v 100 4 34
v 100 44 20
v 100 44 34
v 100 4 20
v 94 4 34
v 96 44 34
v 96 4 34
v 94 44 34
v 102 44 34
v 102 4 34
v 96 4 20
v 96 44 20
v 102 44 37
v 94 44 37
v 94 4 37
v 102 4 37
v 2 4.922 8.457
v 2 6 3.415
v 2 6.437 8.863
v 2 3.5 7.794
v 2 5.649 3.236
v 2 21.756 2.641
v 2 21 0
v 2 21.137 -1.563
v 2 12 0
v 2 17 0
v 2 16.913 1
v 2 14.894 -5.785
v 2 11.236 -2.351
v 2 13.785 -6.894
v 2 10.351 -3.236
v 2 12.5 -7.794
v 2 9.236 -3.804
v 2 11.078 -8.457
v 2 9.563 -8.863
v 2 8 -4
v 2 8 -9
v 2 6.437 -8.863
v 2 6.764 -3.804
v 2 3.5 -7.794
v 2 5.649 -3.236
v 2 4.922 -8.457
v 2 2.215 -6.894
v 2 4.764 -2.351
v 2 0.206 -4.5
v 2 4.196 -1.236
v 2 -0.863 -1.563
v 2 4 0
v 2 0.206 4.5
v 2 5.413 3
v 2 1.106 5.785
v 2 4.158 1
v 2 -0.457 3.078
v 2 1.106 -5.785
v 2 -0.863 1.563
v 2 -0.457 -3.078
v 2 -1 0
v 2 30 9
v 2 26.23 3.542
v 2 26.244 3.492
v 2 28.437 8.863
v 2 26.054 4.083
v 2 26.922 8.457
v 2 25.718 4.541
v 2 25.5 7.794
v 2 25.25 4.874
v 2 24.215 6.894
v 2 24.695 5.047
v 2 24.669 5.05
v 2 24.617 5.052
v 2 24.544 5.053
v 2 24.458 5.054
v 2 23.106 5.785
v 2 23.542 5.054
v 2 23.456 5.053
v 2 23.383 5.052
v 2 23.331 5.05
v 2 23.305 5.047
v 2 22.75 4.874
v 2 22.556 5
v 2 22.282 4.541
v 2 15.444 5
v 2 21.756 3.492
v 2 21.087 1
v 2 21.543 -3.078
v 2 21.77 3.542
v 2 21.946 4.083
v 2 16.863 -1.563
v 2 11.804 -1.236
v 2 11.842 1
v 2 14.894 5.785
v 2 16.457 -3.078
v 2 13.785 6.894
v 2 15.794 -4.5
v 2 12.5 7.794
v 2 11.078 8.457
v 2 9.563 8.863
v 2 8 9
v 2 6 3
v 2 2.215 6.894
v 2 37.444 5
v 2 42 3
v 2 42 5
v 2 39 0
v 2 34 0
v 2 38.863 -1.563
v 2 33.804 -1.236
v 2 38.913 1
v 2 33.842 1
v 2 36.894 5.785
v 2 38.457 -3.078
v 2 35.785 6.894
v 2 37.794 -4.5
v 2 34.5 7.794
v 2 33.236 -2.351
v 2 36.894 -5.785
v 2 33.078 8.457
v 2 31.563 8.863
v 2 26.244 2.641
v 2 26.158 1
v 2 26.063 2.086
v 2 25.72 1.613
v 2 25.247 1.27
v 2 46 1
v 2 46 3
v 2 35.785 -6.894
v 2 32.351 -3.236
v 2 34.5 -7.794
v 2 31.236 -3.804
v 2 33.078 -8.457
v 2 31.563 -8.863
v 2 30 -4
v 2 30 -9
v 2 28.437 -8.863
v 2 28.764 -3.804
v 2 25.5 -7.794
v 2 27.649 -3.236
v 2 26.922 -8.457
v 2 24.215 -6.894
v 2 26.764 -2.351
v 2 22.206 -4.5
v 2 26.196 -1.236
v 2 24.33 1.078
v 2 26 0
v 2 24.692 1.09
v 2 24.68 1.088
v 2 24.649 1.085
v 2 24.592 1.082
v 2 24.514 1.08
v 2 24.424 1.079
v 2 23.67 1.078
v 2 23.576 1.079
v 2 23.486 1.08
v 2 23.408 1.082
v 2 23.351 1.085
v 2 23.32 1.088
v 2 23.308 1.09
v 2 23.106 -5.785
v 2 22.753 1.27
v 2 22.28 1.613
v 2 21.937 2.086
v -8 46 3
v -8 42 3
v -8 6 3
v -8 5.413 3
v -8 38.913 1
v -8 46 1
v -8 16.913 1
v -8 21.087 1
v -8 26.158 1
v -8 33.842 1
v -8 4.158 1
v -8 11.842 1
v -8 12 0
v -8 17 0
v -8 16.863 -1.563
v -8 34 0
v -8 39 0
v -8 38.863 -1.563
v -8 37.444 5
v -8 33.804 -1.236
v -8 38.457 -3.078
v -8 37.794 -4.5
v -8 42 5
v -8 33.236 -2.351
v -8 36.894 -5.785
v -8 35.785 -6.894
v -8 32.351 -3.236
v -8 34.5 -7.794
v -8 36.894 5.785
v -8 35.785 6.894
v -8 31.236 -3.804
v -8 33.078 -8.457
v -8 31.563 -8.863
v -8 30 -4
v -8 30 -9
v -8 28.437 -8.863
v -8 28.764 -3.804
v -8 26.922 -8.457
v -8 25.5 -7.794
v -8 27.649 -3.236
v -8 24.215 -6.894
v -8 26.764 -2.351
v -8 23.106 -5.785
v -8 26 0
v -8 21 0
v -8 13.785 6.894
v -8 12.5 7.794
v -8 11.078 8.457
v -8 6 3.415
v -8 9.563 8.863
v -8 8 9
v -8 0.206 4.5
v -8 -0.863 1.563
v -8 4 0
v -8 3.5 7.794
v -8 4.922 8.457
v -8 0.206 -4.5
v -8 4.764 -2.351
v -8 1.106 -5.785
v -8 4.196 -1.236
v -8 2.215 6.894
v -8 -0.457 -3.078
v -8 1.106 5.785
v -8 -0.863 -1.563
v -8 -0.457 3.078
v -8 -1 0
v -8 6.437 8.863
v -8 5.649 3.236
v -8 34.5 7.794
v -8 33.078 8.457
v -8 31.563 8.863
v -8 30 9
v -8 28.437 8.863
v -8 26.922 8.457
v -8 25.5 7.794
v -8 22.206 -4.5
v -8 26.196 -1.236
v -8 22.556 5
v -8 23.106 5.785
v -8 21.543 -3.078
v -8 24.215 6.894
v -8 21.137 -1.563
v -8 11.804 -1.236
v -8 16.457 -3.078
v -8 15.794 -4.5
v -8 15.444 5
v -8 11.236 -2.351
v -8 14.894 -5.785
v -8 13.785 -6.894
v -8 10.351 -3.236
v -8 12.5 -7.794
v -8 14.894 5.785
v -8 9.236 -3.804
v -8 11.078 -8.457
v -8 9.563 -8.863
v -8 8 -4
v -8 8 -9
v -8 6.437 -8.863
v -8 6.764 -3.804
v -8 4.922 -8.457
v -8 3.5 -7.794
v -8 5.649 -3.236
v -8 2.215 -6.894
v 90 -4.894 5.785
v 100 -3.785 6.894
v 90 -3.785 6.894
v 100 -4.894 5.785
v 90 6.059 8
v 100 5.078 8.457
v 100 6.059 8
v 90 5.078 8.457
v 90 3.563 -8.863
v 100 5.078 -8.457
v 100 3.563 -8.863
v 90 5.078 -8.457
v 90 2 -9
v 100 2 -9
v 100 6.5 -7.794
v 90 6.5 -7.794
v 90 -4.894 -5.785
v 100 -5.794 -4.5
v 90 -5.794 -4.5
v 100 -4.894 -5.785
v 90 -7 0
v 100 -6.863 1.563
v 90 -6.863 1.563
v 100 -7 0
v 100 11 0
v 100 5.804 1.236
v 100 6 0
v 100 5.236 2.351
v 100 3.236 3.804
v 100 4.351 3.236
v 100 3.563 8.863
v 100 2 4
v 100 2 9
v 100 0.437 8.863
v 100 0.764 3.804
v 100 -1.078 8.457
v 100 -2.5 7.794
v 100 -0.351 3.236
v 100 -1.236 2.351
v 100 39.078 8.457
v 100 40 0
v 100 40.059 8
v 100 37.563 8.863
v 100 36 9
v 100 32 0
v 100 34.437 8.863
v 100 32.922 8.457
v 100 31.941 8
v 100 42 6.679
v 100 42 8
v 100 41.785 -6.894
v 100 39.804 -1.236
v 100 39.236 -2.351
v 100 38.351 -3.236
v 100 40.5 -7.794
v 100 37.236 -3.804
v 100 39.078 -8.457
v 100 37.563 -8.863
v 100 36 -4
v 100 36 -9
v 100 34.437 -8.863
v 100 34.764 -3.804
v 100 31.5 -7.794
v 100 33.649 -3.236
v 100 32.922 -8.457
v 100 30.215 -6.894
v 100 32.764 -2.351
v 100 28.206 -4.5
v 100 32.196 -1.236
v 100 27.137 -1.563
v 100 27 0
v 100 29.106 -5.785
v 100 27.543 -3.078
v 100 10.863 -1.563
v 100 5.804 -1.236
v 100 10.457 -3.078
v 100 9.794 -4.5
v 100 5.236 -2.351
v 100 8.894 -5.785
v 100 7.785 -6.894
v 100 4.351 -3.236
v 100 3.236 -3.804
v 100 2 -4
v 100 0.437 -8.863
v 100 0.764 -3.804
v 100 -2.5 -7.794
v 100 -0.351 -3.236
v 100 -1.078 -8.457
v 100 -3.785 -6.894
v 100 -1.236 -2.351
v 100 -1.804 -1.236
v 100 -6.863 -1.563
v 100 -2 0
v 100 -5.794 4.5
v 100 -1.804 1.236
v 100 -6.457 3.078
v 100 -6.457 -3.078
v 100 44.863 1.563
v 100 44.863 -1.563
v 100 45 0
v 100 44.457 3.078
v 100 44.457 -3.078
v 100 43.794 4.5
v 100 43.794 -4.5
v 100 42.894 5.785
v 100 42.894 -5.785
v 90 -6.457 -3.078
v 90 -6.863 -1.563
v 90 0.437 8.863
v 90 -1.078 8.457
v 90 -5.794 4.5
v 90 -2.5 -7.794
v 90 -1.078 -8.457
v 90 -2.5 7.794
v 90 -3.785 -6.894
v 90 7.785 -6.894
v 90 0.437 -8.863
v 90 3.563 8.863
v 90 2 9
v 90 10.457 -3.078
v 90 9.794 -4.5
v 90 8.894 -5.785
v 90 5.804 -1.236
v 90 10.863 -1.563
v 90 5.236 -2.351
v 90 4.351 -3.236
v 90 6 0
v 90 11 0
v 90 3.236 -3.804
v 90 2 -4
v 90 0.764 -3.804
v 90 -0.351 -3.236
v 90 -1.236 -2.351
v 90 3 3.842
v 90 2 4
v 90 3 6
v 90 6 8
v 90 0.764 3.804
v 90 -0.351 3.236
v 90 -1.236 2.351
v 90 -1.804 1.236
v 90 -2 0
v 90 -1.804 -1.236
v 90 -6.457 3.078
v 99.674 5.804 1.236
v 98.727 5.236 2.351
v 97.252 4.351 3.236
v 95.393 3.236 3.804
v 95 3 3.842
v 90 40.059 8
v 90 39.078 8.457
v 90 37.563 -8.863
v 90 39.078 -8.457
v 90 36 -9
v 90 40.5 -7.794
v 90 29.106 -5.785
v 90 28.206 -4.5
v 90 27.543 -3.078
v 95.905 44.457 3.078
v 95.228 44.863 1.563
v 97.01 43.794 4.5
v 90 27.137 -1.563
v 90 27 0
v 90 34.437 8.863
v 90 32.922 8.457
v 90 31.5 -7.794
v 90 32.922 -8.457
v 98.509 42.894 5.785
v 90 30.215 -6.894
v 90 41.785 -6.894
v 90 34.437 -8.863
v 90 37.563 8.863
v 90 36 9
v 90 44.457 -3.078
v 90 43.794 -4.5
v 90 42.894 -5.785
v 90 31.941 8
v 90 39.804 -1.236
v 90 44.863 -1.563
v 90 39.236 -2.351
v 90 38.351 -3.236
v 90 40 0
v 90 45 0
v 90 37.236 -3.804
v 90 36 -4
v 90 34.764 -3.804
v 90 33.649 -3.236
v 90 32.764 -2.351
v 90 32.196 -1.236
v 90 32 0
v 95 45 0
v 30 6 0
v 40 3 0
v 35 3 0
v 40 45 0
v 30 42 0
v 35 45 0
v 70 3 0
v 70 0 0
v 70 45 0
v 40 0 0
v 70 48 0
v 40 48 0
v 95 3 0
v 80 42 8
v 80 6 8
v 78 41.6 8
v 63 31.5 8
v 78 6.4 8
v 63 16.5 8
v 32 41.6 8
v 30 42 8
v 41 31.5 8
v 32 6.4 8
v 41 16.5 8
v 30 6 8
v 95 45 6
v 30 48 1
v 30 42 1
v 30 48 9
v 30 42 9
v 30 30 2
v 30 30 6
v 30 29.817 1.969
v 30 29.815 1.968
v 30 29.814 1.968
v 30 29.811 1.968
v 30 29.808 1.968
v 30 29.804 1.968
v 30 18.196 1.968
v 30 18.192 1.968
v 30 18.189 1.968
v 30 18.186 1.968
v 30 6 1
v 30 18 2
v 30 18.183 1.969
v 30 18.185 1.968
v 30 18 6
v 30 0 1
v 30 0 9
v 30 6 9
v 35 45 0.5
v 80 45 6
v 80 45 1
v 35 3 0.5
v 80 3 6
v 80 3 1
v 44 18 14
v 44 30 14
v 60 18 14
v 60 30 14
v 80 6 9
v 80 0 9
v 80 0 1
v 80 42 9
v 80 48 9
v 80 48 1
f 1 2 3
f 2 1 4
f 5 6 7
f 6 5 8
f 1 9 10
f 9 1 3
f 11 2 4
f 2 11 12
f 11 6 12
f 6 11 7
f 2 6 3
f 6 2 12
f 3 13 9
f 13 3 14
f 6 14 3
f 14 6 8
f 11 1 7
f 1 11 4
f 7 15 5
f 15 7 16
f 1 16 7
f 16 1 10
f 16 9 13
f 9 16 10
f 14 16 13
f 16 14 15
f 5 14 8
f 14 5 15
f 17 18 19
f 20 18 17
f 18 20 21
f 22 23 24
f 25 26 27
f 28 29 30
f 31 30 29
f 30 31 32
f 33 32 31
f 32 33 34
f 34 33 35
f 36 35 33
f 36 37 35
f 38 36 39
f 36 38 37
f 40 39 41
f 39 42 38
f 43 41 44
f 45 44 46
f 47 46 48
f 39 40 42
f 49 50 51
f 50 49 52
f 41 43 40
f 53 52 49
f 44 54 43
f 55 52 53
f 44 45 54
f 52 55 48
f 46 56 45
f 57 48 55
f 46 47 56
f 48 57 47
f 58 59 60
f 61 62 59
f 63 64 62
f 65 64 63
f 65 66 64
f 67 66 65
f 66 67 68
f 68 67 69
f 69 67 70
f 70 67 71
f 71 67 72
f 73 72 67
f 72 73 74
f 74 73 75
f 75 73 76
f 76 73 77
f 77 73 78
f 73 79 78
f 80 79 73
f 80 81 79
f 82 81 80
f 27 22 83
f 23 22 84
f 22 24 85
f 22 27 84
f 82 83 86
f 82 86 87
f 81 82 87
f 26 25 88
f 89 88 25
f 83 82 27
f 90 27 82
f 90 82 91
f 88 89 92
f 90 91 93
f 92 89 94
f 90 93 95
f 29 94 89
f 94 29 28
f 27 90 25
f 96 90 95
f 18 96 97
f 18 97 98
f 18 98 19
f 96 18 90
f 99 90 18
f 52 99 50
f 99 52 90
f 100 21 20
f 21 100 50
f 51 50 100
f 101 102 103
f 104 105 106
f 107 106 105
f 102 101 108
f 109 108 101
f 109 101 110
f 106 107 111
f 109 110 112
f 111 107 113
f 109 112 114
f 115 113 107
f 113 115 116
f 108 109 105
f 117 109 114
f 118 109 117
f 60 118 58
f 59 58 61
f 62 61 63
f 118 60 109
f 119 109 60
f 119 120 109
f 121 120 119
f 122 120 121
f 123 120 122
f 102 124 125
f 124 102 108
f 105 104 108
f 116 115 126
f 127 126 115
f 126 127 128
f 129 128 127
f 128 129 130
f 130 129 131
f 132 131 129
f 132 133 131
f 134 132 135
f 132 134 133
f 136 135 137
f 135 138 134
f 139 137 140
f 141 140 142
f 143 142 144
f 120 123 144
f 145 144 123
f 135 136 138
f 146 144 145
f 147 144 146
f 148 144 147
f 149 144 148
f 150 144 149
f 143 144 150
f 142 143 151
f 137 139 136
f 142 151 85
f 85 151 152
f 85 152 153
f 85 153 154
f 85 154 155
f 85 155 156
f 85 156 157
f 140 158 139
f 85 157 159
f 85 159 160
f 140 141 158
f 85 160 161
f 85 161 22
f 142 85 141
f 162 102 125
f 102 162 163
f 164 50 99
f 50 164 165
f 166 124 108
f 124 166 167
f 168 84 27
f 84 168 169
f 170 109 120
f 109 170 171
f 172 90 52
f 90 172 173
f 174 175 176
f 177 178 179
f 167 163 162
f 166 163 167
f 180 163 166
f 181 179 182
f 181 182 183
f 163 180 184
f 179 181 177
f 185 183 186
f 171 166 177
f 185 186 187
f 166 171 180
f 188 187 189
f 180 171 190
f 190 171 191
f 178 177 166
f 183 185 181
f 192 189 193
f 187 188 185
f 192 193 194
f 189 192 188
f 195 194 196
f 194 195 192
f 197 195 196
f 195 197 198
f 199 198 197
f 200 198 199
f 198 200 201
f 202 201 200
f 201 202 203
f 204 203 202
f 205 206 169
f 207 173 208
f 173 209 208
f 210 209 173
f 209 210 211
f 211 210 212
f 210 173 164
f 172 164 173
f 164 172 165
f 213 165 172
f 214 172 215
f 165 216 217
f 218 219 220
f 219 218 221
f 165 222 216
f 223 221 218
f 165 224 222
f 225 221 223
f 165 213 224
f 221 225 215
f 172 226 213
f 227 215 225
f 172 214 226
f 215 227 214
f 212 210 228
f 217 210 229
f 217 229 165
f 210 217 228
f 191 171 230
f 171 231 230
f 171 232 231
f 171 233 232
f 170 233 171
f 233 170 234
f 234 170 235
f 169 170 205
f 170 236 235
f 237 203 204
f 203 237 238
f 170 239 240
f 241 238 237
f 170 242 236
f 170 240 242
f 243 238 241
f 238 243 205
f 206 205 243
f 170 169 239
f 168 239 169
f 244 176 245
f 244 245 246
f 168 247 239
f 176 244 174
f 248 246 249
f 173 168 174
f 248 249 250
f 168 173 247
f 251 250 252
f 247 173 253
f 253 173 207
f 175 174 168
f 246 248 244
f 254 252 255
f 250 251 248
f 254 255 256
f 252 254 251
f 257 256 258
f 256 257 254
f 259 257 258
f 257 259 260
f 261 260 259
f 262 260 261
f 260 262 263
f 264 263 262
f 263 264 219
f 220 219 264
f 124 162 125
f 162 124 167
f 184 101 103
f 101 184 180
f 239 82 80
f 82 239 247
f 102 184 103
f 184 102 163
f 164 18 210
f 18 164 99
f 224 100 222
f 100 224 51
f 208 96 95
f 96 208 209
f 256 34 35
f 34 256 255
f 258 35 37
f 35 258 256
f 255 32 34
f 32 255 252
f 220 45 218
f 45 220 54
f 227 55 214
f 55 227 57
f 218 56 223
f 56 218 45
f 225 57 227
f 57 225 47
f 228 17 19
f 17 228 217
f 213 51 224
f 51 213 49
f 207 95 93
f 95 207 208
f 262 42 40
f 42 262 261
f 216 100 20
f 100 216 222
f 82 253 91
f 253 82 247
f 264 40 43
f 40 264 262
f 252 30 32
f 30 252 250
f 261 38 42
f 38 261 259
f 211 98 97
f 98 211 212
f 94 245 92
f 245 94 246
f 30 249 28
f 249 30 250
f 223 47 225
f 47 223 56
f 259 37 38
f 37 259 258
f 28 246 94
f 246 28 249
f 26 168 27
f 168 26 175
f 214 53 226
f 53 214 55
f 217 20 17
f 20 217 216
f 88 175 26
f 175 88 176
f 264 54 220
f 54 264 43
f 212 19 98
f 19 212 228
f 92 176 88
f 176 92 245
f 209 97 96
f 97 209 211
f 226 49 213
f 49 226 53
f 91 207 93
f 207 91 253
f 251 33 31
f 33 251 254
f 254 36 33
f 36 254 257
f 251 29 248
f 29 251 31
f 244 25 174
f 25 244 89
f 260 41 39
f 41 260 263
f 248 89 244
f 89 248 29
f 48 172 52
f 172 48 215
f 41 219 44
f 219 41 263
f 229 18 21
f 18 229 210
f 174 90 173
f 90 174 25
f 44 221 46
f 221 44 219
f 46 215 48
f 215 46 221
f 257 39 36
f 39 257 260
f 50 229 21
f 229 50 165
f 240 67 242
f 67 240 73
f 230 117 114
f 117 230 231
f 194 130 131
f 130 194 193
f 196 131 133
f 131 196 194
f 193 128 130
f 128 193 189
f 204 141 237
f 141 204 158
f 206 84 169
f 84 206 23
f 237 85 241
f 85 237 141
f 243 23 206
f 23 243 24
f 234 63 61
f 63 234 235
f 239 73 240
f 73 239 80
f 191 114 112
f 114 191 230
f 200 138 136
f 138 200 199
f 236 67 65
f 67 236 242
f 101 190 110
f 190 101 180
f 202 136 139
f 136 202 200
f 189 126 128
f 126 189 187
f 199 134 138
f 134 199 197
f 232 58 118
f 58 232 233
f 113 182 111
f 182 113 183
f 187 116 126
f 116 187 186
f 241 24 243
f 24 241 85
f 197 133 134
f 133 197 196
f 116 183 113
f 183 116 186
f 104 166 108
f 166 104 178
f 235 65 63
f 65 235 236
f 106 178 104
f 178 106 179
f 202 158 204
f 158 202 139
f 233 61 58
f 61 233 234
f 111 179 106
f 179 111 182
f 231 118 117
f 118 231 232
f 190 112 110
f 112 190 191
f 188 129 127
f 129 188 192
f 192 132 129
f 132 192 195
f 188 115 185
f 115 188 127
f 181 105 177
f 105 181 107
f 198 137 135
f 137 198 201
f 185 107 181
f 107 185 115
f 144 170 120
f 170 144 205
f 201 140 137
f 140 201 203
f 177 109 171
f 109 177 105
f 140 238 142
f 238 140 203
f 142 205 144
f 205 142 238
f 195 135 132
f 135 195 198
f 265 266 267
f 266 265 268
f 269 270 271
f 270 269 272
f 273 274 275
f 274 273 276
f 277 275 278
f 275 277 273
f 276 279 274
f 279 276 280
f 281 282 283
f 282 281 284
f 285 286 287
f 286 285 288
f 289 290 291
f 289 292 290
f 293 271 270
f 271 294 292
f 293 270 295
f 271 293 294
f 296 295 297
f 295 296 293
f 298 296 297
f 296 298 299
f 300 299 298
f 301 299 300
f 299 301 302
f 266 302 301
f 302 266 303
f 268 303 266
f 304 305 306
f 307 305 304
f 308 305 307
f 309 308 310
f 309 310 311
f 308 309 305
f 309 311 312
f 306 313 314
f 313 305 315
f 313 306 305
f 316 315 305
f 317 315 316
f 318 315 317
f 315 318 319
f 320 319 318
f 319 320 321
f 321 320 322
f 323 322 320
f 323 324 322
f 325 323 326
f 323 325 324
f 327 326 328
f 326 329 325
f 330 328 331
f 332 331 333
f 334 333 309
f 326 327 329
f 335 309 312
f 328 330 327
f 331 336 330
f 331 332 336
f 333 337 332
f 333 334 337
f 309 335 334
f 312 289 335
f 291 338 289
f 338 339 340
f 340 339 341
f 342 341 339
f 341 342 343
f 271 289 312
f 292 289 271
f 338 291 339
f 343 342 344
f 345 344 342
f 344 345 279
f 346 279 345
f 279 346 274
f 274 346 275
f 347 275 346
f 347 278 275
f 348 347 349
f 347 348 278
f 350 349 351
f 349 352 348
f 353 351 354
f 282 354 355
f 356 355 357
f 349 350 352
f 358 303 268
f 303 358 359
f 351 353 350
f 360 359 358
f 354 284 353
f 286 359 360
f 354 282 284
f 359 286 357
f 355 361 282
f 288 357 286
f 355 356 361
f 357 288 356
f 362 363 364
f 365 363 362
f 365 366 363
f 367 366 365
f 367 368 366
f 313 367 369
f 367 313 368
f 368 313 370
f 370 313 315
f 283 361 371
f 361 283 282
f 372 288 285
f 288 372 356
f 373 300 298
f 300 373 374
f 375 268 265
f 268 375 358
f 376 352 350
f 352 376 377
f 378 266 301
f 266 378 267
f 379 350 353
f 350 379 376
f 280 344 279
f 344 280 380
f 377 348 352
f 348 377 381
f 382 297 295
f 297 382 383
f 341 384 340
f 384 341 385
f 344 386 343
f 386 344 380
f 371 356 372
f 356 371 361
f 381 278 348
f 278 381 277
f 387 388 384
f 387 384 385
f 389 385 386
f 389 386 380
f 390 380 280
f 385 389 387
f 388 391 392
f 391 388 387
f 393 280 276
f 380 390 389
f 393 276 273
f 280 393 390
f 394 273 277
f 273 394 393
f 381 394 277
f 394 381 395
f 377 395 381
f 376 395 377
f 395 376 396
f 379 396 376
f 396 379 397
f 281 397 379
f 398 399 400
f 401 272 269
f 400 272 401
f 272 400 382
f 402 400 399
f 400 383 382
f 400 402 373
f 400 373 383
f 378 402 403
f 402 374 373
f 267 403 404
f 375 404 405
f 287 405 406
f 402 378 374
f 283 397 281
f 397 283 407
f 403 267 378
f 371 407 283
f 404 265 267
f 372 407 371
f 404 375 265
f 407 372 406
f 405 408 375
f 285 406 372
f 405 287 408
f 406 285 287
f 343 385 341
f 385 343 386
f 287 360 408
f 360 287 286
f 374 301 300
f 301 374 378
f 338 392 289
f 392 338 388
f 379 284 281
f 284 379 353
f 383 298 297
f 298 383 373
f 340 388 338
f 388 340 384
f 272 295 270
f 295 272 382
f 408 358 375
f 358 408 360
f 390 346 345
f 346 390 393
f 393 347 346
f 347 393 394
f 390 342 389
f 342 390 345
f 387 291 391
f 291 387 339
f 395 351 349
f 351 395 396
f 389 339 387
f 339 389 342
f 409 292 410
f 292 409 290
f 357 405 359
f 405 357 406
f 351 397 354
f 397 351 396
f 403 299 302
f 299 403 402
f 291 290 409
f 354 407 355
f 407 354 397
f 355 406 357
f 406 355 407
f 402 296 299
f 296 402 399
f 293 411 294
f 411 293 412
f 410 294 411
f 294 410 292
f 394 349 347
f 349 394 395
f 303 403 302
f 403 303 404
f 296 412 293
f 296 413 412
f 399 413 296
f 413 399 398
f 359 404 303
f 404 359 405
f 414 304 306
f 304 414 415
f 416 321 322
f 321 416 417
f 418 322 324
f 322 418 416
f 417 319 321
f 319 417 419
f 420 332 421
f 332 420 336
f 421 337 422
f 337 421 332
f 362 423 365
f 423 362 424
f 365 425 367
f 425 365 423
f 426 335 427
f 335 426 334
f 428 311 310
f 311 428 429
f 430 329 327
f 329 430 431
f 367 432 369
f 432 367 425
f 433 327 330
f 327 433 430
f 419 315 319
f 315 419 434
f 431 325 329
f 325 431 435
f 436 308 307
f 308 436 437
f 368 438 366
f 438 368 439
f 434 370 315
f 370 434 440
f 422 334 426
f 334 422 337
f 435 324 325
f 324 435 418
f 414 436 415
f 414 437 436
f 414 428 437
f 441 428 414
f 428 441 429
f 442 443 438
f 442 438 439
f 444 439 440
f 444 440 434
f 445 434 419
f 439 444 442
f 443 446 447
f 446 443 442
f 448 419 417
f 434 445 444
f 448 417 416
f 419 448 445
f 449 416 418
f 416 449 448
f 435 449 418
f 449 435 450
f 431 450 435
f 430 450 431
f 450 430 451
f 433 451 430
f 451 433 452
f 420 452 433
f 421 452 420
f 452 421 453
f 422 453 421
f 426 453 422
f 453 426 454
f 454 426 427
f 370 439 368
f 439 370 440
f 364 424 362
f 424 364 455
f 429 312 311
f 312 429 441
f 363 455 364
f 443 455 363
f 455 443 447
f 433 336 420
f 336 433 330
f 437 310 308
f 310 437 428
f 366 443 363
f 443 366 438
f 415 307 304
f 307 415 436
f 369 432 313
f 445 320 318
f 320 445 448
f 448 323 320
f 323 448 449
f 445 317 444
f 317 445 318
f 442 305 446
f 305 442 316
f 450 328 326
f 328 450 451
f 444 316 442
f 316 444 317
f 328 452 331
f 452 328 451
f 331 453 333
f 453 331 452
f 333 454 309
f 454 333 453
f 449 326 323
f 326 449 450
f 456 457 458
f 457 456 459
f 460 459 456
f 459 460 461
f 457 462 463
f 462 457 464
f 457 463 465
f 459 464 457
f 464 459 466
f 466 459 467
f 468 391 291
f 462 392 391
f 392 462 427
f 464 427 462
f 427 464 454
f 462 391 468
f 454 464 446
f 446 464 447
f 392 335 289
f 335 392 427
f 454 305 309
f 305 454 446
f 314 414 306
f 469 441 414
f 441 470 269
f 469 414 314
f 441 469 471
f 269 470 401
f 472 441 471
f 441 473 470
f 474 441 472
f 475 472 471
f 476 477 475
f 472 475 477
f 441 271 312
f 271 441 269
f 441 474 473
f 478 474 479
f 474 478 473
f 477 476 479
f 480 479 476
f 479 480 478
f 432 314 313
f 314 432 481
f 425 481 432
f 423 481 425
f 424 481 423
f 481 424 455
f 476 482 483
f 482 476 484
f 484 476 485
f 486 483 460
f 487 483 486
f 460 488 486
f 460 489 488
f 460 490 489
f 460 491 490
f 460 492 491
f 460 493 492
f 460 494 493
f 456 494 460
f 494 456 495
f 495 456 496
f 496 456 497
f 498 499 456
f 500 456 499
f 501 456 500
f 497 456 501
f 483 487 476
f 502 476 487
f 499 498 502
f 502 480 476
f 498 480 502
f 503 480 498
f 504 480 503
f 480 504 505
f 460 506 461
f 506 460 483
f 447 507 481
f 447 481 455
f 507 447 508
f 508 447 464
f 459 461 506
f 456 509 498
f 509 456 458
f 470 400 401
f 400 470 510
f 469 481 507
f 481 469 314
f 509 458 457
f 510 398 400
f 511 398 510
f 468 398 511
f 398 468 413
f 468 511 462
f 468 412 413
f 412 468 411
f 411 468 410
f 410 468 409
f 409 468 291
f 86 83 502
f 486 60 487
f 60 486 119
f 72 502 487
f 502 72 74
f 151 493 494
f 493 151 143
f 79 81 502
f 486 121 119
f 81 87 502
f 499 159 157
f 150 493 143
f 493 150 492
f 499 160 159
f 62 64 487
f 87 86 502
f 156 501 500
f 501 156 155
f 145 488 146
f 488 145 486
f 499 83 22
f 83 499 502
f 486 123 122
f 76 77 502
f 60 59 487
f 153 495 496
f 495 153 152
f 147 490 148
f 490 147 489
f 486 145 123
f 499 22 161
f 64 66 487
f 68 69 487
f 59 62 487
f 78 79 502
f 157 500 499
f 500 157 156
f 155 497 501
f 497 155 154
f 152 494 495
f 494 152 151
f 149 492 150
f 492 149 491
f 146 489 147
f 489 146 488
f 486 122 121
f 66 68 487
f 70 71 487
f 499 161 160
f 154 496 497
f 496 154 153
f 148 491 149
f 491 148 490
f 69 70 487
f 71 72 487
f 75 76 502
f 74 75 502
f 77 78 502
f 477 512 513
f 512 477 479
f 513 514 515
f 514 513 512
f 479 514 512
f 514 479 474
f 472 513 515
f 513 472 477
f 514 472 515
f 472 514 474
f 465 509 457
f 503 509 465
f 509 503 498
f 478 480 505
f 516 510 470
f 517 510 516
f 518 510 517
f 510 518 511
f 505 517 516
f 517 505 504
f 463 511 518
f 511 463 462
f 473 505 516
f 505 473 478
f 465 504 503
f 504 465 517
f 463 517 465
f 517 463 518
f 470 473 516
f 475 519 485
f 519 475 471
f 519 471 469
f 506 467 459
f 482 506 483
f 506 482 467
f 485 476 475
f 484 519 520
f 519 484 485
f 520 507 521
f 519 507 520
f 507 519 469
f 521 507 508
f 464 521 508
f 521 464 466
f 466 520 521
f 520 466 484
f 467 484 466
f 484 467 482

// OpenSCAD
// Formula 1 Car Display Model - Decorative / Gift
// 1:43 scale rough approximation
// Print: 0.15mm, 4 walls, 20% infill, supports for underside

LENGTH = 110;
WIDTH  = 48;
NOSE_L = 30;

module nosecone() {
    hull() {
        translate([0, WIDTH/2, 3]) sphere(d = 4, $fn = 20);
        translate([NOSE_L, WIDTH/2 - 6, 2]) cube([1, 12, 4]);
    }
}

module cockpit() {
    translate([NOSE_L + 10, WIDTH/2 - 8, 4])
        hull() {
            cube([24, 16, 2]);
            translate([4, 2, 8]) cube([16, 12, 2]);
        }
}

module sidepod() {
    hull() {
        translate([NOSE_L, 0, 1]) cube([50, 6, 8]);
        translate([NOSE_L + 10, 0, 0]) cube([30, 8, 4]);
    }
}

module rear_wing() {
    translate([LENGTH - 14, 4, 20]) {
        cube([4, WIDTH - 8, 14]);   // main plane
        translate([-2, 0, 14]) cube([8, WIDTH - 8, 3]); // upper flap
    }
}

module front_wing() {
    translate([-8, 2, 1]) {
        cube([10, WIDTH - 4, 2]);   // main plane
        translate([0, 4, 2]) cube([10, WIDTH - 12, 2]); // upper flap
    }
}

module wheel_assembly(pos) {
    translate(pos)
        rotate([0, 90, 0])
            difference() {
                cylinder(d = 18, h = 10, $fn = 36);
                cylinder(d = 8, h = 10, $fn = 20);
            }
}

union() {
    // Main body
    hull() {
        translate([NOSE_L, 6, 0]) cube([LENGTH - NOSE_L - 10, WIDTH - 12, 8]);
        translate([NOSE_L + 5, 3, 0]) cube([LENGTH - NOSE_L - 20, WIDTH - 6, 6]);
    }

    nosecone();
    cockpit();
    sidepod();
    mirror([0, 1, 0]) translate([0, -WIDTH, 0]) sidepod();
    rear_wing();
    front_wing();

    // Wheels
    wheel_assembly([-8, 8, 0]);
    wheel_assembly([-8, WIDTH - 18, 0]);
    wheel_assembly([LENGTH - 20, 2, 0]);
    wheel_assembly([LENGTH - 20, WIDTH - 12, 0]);
}
